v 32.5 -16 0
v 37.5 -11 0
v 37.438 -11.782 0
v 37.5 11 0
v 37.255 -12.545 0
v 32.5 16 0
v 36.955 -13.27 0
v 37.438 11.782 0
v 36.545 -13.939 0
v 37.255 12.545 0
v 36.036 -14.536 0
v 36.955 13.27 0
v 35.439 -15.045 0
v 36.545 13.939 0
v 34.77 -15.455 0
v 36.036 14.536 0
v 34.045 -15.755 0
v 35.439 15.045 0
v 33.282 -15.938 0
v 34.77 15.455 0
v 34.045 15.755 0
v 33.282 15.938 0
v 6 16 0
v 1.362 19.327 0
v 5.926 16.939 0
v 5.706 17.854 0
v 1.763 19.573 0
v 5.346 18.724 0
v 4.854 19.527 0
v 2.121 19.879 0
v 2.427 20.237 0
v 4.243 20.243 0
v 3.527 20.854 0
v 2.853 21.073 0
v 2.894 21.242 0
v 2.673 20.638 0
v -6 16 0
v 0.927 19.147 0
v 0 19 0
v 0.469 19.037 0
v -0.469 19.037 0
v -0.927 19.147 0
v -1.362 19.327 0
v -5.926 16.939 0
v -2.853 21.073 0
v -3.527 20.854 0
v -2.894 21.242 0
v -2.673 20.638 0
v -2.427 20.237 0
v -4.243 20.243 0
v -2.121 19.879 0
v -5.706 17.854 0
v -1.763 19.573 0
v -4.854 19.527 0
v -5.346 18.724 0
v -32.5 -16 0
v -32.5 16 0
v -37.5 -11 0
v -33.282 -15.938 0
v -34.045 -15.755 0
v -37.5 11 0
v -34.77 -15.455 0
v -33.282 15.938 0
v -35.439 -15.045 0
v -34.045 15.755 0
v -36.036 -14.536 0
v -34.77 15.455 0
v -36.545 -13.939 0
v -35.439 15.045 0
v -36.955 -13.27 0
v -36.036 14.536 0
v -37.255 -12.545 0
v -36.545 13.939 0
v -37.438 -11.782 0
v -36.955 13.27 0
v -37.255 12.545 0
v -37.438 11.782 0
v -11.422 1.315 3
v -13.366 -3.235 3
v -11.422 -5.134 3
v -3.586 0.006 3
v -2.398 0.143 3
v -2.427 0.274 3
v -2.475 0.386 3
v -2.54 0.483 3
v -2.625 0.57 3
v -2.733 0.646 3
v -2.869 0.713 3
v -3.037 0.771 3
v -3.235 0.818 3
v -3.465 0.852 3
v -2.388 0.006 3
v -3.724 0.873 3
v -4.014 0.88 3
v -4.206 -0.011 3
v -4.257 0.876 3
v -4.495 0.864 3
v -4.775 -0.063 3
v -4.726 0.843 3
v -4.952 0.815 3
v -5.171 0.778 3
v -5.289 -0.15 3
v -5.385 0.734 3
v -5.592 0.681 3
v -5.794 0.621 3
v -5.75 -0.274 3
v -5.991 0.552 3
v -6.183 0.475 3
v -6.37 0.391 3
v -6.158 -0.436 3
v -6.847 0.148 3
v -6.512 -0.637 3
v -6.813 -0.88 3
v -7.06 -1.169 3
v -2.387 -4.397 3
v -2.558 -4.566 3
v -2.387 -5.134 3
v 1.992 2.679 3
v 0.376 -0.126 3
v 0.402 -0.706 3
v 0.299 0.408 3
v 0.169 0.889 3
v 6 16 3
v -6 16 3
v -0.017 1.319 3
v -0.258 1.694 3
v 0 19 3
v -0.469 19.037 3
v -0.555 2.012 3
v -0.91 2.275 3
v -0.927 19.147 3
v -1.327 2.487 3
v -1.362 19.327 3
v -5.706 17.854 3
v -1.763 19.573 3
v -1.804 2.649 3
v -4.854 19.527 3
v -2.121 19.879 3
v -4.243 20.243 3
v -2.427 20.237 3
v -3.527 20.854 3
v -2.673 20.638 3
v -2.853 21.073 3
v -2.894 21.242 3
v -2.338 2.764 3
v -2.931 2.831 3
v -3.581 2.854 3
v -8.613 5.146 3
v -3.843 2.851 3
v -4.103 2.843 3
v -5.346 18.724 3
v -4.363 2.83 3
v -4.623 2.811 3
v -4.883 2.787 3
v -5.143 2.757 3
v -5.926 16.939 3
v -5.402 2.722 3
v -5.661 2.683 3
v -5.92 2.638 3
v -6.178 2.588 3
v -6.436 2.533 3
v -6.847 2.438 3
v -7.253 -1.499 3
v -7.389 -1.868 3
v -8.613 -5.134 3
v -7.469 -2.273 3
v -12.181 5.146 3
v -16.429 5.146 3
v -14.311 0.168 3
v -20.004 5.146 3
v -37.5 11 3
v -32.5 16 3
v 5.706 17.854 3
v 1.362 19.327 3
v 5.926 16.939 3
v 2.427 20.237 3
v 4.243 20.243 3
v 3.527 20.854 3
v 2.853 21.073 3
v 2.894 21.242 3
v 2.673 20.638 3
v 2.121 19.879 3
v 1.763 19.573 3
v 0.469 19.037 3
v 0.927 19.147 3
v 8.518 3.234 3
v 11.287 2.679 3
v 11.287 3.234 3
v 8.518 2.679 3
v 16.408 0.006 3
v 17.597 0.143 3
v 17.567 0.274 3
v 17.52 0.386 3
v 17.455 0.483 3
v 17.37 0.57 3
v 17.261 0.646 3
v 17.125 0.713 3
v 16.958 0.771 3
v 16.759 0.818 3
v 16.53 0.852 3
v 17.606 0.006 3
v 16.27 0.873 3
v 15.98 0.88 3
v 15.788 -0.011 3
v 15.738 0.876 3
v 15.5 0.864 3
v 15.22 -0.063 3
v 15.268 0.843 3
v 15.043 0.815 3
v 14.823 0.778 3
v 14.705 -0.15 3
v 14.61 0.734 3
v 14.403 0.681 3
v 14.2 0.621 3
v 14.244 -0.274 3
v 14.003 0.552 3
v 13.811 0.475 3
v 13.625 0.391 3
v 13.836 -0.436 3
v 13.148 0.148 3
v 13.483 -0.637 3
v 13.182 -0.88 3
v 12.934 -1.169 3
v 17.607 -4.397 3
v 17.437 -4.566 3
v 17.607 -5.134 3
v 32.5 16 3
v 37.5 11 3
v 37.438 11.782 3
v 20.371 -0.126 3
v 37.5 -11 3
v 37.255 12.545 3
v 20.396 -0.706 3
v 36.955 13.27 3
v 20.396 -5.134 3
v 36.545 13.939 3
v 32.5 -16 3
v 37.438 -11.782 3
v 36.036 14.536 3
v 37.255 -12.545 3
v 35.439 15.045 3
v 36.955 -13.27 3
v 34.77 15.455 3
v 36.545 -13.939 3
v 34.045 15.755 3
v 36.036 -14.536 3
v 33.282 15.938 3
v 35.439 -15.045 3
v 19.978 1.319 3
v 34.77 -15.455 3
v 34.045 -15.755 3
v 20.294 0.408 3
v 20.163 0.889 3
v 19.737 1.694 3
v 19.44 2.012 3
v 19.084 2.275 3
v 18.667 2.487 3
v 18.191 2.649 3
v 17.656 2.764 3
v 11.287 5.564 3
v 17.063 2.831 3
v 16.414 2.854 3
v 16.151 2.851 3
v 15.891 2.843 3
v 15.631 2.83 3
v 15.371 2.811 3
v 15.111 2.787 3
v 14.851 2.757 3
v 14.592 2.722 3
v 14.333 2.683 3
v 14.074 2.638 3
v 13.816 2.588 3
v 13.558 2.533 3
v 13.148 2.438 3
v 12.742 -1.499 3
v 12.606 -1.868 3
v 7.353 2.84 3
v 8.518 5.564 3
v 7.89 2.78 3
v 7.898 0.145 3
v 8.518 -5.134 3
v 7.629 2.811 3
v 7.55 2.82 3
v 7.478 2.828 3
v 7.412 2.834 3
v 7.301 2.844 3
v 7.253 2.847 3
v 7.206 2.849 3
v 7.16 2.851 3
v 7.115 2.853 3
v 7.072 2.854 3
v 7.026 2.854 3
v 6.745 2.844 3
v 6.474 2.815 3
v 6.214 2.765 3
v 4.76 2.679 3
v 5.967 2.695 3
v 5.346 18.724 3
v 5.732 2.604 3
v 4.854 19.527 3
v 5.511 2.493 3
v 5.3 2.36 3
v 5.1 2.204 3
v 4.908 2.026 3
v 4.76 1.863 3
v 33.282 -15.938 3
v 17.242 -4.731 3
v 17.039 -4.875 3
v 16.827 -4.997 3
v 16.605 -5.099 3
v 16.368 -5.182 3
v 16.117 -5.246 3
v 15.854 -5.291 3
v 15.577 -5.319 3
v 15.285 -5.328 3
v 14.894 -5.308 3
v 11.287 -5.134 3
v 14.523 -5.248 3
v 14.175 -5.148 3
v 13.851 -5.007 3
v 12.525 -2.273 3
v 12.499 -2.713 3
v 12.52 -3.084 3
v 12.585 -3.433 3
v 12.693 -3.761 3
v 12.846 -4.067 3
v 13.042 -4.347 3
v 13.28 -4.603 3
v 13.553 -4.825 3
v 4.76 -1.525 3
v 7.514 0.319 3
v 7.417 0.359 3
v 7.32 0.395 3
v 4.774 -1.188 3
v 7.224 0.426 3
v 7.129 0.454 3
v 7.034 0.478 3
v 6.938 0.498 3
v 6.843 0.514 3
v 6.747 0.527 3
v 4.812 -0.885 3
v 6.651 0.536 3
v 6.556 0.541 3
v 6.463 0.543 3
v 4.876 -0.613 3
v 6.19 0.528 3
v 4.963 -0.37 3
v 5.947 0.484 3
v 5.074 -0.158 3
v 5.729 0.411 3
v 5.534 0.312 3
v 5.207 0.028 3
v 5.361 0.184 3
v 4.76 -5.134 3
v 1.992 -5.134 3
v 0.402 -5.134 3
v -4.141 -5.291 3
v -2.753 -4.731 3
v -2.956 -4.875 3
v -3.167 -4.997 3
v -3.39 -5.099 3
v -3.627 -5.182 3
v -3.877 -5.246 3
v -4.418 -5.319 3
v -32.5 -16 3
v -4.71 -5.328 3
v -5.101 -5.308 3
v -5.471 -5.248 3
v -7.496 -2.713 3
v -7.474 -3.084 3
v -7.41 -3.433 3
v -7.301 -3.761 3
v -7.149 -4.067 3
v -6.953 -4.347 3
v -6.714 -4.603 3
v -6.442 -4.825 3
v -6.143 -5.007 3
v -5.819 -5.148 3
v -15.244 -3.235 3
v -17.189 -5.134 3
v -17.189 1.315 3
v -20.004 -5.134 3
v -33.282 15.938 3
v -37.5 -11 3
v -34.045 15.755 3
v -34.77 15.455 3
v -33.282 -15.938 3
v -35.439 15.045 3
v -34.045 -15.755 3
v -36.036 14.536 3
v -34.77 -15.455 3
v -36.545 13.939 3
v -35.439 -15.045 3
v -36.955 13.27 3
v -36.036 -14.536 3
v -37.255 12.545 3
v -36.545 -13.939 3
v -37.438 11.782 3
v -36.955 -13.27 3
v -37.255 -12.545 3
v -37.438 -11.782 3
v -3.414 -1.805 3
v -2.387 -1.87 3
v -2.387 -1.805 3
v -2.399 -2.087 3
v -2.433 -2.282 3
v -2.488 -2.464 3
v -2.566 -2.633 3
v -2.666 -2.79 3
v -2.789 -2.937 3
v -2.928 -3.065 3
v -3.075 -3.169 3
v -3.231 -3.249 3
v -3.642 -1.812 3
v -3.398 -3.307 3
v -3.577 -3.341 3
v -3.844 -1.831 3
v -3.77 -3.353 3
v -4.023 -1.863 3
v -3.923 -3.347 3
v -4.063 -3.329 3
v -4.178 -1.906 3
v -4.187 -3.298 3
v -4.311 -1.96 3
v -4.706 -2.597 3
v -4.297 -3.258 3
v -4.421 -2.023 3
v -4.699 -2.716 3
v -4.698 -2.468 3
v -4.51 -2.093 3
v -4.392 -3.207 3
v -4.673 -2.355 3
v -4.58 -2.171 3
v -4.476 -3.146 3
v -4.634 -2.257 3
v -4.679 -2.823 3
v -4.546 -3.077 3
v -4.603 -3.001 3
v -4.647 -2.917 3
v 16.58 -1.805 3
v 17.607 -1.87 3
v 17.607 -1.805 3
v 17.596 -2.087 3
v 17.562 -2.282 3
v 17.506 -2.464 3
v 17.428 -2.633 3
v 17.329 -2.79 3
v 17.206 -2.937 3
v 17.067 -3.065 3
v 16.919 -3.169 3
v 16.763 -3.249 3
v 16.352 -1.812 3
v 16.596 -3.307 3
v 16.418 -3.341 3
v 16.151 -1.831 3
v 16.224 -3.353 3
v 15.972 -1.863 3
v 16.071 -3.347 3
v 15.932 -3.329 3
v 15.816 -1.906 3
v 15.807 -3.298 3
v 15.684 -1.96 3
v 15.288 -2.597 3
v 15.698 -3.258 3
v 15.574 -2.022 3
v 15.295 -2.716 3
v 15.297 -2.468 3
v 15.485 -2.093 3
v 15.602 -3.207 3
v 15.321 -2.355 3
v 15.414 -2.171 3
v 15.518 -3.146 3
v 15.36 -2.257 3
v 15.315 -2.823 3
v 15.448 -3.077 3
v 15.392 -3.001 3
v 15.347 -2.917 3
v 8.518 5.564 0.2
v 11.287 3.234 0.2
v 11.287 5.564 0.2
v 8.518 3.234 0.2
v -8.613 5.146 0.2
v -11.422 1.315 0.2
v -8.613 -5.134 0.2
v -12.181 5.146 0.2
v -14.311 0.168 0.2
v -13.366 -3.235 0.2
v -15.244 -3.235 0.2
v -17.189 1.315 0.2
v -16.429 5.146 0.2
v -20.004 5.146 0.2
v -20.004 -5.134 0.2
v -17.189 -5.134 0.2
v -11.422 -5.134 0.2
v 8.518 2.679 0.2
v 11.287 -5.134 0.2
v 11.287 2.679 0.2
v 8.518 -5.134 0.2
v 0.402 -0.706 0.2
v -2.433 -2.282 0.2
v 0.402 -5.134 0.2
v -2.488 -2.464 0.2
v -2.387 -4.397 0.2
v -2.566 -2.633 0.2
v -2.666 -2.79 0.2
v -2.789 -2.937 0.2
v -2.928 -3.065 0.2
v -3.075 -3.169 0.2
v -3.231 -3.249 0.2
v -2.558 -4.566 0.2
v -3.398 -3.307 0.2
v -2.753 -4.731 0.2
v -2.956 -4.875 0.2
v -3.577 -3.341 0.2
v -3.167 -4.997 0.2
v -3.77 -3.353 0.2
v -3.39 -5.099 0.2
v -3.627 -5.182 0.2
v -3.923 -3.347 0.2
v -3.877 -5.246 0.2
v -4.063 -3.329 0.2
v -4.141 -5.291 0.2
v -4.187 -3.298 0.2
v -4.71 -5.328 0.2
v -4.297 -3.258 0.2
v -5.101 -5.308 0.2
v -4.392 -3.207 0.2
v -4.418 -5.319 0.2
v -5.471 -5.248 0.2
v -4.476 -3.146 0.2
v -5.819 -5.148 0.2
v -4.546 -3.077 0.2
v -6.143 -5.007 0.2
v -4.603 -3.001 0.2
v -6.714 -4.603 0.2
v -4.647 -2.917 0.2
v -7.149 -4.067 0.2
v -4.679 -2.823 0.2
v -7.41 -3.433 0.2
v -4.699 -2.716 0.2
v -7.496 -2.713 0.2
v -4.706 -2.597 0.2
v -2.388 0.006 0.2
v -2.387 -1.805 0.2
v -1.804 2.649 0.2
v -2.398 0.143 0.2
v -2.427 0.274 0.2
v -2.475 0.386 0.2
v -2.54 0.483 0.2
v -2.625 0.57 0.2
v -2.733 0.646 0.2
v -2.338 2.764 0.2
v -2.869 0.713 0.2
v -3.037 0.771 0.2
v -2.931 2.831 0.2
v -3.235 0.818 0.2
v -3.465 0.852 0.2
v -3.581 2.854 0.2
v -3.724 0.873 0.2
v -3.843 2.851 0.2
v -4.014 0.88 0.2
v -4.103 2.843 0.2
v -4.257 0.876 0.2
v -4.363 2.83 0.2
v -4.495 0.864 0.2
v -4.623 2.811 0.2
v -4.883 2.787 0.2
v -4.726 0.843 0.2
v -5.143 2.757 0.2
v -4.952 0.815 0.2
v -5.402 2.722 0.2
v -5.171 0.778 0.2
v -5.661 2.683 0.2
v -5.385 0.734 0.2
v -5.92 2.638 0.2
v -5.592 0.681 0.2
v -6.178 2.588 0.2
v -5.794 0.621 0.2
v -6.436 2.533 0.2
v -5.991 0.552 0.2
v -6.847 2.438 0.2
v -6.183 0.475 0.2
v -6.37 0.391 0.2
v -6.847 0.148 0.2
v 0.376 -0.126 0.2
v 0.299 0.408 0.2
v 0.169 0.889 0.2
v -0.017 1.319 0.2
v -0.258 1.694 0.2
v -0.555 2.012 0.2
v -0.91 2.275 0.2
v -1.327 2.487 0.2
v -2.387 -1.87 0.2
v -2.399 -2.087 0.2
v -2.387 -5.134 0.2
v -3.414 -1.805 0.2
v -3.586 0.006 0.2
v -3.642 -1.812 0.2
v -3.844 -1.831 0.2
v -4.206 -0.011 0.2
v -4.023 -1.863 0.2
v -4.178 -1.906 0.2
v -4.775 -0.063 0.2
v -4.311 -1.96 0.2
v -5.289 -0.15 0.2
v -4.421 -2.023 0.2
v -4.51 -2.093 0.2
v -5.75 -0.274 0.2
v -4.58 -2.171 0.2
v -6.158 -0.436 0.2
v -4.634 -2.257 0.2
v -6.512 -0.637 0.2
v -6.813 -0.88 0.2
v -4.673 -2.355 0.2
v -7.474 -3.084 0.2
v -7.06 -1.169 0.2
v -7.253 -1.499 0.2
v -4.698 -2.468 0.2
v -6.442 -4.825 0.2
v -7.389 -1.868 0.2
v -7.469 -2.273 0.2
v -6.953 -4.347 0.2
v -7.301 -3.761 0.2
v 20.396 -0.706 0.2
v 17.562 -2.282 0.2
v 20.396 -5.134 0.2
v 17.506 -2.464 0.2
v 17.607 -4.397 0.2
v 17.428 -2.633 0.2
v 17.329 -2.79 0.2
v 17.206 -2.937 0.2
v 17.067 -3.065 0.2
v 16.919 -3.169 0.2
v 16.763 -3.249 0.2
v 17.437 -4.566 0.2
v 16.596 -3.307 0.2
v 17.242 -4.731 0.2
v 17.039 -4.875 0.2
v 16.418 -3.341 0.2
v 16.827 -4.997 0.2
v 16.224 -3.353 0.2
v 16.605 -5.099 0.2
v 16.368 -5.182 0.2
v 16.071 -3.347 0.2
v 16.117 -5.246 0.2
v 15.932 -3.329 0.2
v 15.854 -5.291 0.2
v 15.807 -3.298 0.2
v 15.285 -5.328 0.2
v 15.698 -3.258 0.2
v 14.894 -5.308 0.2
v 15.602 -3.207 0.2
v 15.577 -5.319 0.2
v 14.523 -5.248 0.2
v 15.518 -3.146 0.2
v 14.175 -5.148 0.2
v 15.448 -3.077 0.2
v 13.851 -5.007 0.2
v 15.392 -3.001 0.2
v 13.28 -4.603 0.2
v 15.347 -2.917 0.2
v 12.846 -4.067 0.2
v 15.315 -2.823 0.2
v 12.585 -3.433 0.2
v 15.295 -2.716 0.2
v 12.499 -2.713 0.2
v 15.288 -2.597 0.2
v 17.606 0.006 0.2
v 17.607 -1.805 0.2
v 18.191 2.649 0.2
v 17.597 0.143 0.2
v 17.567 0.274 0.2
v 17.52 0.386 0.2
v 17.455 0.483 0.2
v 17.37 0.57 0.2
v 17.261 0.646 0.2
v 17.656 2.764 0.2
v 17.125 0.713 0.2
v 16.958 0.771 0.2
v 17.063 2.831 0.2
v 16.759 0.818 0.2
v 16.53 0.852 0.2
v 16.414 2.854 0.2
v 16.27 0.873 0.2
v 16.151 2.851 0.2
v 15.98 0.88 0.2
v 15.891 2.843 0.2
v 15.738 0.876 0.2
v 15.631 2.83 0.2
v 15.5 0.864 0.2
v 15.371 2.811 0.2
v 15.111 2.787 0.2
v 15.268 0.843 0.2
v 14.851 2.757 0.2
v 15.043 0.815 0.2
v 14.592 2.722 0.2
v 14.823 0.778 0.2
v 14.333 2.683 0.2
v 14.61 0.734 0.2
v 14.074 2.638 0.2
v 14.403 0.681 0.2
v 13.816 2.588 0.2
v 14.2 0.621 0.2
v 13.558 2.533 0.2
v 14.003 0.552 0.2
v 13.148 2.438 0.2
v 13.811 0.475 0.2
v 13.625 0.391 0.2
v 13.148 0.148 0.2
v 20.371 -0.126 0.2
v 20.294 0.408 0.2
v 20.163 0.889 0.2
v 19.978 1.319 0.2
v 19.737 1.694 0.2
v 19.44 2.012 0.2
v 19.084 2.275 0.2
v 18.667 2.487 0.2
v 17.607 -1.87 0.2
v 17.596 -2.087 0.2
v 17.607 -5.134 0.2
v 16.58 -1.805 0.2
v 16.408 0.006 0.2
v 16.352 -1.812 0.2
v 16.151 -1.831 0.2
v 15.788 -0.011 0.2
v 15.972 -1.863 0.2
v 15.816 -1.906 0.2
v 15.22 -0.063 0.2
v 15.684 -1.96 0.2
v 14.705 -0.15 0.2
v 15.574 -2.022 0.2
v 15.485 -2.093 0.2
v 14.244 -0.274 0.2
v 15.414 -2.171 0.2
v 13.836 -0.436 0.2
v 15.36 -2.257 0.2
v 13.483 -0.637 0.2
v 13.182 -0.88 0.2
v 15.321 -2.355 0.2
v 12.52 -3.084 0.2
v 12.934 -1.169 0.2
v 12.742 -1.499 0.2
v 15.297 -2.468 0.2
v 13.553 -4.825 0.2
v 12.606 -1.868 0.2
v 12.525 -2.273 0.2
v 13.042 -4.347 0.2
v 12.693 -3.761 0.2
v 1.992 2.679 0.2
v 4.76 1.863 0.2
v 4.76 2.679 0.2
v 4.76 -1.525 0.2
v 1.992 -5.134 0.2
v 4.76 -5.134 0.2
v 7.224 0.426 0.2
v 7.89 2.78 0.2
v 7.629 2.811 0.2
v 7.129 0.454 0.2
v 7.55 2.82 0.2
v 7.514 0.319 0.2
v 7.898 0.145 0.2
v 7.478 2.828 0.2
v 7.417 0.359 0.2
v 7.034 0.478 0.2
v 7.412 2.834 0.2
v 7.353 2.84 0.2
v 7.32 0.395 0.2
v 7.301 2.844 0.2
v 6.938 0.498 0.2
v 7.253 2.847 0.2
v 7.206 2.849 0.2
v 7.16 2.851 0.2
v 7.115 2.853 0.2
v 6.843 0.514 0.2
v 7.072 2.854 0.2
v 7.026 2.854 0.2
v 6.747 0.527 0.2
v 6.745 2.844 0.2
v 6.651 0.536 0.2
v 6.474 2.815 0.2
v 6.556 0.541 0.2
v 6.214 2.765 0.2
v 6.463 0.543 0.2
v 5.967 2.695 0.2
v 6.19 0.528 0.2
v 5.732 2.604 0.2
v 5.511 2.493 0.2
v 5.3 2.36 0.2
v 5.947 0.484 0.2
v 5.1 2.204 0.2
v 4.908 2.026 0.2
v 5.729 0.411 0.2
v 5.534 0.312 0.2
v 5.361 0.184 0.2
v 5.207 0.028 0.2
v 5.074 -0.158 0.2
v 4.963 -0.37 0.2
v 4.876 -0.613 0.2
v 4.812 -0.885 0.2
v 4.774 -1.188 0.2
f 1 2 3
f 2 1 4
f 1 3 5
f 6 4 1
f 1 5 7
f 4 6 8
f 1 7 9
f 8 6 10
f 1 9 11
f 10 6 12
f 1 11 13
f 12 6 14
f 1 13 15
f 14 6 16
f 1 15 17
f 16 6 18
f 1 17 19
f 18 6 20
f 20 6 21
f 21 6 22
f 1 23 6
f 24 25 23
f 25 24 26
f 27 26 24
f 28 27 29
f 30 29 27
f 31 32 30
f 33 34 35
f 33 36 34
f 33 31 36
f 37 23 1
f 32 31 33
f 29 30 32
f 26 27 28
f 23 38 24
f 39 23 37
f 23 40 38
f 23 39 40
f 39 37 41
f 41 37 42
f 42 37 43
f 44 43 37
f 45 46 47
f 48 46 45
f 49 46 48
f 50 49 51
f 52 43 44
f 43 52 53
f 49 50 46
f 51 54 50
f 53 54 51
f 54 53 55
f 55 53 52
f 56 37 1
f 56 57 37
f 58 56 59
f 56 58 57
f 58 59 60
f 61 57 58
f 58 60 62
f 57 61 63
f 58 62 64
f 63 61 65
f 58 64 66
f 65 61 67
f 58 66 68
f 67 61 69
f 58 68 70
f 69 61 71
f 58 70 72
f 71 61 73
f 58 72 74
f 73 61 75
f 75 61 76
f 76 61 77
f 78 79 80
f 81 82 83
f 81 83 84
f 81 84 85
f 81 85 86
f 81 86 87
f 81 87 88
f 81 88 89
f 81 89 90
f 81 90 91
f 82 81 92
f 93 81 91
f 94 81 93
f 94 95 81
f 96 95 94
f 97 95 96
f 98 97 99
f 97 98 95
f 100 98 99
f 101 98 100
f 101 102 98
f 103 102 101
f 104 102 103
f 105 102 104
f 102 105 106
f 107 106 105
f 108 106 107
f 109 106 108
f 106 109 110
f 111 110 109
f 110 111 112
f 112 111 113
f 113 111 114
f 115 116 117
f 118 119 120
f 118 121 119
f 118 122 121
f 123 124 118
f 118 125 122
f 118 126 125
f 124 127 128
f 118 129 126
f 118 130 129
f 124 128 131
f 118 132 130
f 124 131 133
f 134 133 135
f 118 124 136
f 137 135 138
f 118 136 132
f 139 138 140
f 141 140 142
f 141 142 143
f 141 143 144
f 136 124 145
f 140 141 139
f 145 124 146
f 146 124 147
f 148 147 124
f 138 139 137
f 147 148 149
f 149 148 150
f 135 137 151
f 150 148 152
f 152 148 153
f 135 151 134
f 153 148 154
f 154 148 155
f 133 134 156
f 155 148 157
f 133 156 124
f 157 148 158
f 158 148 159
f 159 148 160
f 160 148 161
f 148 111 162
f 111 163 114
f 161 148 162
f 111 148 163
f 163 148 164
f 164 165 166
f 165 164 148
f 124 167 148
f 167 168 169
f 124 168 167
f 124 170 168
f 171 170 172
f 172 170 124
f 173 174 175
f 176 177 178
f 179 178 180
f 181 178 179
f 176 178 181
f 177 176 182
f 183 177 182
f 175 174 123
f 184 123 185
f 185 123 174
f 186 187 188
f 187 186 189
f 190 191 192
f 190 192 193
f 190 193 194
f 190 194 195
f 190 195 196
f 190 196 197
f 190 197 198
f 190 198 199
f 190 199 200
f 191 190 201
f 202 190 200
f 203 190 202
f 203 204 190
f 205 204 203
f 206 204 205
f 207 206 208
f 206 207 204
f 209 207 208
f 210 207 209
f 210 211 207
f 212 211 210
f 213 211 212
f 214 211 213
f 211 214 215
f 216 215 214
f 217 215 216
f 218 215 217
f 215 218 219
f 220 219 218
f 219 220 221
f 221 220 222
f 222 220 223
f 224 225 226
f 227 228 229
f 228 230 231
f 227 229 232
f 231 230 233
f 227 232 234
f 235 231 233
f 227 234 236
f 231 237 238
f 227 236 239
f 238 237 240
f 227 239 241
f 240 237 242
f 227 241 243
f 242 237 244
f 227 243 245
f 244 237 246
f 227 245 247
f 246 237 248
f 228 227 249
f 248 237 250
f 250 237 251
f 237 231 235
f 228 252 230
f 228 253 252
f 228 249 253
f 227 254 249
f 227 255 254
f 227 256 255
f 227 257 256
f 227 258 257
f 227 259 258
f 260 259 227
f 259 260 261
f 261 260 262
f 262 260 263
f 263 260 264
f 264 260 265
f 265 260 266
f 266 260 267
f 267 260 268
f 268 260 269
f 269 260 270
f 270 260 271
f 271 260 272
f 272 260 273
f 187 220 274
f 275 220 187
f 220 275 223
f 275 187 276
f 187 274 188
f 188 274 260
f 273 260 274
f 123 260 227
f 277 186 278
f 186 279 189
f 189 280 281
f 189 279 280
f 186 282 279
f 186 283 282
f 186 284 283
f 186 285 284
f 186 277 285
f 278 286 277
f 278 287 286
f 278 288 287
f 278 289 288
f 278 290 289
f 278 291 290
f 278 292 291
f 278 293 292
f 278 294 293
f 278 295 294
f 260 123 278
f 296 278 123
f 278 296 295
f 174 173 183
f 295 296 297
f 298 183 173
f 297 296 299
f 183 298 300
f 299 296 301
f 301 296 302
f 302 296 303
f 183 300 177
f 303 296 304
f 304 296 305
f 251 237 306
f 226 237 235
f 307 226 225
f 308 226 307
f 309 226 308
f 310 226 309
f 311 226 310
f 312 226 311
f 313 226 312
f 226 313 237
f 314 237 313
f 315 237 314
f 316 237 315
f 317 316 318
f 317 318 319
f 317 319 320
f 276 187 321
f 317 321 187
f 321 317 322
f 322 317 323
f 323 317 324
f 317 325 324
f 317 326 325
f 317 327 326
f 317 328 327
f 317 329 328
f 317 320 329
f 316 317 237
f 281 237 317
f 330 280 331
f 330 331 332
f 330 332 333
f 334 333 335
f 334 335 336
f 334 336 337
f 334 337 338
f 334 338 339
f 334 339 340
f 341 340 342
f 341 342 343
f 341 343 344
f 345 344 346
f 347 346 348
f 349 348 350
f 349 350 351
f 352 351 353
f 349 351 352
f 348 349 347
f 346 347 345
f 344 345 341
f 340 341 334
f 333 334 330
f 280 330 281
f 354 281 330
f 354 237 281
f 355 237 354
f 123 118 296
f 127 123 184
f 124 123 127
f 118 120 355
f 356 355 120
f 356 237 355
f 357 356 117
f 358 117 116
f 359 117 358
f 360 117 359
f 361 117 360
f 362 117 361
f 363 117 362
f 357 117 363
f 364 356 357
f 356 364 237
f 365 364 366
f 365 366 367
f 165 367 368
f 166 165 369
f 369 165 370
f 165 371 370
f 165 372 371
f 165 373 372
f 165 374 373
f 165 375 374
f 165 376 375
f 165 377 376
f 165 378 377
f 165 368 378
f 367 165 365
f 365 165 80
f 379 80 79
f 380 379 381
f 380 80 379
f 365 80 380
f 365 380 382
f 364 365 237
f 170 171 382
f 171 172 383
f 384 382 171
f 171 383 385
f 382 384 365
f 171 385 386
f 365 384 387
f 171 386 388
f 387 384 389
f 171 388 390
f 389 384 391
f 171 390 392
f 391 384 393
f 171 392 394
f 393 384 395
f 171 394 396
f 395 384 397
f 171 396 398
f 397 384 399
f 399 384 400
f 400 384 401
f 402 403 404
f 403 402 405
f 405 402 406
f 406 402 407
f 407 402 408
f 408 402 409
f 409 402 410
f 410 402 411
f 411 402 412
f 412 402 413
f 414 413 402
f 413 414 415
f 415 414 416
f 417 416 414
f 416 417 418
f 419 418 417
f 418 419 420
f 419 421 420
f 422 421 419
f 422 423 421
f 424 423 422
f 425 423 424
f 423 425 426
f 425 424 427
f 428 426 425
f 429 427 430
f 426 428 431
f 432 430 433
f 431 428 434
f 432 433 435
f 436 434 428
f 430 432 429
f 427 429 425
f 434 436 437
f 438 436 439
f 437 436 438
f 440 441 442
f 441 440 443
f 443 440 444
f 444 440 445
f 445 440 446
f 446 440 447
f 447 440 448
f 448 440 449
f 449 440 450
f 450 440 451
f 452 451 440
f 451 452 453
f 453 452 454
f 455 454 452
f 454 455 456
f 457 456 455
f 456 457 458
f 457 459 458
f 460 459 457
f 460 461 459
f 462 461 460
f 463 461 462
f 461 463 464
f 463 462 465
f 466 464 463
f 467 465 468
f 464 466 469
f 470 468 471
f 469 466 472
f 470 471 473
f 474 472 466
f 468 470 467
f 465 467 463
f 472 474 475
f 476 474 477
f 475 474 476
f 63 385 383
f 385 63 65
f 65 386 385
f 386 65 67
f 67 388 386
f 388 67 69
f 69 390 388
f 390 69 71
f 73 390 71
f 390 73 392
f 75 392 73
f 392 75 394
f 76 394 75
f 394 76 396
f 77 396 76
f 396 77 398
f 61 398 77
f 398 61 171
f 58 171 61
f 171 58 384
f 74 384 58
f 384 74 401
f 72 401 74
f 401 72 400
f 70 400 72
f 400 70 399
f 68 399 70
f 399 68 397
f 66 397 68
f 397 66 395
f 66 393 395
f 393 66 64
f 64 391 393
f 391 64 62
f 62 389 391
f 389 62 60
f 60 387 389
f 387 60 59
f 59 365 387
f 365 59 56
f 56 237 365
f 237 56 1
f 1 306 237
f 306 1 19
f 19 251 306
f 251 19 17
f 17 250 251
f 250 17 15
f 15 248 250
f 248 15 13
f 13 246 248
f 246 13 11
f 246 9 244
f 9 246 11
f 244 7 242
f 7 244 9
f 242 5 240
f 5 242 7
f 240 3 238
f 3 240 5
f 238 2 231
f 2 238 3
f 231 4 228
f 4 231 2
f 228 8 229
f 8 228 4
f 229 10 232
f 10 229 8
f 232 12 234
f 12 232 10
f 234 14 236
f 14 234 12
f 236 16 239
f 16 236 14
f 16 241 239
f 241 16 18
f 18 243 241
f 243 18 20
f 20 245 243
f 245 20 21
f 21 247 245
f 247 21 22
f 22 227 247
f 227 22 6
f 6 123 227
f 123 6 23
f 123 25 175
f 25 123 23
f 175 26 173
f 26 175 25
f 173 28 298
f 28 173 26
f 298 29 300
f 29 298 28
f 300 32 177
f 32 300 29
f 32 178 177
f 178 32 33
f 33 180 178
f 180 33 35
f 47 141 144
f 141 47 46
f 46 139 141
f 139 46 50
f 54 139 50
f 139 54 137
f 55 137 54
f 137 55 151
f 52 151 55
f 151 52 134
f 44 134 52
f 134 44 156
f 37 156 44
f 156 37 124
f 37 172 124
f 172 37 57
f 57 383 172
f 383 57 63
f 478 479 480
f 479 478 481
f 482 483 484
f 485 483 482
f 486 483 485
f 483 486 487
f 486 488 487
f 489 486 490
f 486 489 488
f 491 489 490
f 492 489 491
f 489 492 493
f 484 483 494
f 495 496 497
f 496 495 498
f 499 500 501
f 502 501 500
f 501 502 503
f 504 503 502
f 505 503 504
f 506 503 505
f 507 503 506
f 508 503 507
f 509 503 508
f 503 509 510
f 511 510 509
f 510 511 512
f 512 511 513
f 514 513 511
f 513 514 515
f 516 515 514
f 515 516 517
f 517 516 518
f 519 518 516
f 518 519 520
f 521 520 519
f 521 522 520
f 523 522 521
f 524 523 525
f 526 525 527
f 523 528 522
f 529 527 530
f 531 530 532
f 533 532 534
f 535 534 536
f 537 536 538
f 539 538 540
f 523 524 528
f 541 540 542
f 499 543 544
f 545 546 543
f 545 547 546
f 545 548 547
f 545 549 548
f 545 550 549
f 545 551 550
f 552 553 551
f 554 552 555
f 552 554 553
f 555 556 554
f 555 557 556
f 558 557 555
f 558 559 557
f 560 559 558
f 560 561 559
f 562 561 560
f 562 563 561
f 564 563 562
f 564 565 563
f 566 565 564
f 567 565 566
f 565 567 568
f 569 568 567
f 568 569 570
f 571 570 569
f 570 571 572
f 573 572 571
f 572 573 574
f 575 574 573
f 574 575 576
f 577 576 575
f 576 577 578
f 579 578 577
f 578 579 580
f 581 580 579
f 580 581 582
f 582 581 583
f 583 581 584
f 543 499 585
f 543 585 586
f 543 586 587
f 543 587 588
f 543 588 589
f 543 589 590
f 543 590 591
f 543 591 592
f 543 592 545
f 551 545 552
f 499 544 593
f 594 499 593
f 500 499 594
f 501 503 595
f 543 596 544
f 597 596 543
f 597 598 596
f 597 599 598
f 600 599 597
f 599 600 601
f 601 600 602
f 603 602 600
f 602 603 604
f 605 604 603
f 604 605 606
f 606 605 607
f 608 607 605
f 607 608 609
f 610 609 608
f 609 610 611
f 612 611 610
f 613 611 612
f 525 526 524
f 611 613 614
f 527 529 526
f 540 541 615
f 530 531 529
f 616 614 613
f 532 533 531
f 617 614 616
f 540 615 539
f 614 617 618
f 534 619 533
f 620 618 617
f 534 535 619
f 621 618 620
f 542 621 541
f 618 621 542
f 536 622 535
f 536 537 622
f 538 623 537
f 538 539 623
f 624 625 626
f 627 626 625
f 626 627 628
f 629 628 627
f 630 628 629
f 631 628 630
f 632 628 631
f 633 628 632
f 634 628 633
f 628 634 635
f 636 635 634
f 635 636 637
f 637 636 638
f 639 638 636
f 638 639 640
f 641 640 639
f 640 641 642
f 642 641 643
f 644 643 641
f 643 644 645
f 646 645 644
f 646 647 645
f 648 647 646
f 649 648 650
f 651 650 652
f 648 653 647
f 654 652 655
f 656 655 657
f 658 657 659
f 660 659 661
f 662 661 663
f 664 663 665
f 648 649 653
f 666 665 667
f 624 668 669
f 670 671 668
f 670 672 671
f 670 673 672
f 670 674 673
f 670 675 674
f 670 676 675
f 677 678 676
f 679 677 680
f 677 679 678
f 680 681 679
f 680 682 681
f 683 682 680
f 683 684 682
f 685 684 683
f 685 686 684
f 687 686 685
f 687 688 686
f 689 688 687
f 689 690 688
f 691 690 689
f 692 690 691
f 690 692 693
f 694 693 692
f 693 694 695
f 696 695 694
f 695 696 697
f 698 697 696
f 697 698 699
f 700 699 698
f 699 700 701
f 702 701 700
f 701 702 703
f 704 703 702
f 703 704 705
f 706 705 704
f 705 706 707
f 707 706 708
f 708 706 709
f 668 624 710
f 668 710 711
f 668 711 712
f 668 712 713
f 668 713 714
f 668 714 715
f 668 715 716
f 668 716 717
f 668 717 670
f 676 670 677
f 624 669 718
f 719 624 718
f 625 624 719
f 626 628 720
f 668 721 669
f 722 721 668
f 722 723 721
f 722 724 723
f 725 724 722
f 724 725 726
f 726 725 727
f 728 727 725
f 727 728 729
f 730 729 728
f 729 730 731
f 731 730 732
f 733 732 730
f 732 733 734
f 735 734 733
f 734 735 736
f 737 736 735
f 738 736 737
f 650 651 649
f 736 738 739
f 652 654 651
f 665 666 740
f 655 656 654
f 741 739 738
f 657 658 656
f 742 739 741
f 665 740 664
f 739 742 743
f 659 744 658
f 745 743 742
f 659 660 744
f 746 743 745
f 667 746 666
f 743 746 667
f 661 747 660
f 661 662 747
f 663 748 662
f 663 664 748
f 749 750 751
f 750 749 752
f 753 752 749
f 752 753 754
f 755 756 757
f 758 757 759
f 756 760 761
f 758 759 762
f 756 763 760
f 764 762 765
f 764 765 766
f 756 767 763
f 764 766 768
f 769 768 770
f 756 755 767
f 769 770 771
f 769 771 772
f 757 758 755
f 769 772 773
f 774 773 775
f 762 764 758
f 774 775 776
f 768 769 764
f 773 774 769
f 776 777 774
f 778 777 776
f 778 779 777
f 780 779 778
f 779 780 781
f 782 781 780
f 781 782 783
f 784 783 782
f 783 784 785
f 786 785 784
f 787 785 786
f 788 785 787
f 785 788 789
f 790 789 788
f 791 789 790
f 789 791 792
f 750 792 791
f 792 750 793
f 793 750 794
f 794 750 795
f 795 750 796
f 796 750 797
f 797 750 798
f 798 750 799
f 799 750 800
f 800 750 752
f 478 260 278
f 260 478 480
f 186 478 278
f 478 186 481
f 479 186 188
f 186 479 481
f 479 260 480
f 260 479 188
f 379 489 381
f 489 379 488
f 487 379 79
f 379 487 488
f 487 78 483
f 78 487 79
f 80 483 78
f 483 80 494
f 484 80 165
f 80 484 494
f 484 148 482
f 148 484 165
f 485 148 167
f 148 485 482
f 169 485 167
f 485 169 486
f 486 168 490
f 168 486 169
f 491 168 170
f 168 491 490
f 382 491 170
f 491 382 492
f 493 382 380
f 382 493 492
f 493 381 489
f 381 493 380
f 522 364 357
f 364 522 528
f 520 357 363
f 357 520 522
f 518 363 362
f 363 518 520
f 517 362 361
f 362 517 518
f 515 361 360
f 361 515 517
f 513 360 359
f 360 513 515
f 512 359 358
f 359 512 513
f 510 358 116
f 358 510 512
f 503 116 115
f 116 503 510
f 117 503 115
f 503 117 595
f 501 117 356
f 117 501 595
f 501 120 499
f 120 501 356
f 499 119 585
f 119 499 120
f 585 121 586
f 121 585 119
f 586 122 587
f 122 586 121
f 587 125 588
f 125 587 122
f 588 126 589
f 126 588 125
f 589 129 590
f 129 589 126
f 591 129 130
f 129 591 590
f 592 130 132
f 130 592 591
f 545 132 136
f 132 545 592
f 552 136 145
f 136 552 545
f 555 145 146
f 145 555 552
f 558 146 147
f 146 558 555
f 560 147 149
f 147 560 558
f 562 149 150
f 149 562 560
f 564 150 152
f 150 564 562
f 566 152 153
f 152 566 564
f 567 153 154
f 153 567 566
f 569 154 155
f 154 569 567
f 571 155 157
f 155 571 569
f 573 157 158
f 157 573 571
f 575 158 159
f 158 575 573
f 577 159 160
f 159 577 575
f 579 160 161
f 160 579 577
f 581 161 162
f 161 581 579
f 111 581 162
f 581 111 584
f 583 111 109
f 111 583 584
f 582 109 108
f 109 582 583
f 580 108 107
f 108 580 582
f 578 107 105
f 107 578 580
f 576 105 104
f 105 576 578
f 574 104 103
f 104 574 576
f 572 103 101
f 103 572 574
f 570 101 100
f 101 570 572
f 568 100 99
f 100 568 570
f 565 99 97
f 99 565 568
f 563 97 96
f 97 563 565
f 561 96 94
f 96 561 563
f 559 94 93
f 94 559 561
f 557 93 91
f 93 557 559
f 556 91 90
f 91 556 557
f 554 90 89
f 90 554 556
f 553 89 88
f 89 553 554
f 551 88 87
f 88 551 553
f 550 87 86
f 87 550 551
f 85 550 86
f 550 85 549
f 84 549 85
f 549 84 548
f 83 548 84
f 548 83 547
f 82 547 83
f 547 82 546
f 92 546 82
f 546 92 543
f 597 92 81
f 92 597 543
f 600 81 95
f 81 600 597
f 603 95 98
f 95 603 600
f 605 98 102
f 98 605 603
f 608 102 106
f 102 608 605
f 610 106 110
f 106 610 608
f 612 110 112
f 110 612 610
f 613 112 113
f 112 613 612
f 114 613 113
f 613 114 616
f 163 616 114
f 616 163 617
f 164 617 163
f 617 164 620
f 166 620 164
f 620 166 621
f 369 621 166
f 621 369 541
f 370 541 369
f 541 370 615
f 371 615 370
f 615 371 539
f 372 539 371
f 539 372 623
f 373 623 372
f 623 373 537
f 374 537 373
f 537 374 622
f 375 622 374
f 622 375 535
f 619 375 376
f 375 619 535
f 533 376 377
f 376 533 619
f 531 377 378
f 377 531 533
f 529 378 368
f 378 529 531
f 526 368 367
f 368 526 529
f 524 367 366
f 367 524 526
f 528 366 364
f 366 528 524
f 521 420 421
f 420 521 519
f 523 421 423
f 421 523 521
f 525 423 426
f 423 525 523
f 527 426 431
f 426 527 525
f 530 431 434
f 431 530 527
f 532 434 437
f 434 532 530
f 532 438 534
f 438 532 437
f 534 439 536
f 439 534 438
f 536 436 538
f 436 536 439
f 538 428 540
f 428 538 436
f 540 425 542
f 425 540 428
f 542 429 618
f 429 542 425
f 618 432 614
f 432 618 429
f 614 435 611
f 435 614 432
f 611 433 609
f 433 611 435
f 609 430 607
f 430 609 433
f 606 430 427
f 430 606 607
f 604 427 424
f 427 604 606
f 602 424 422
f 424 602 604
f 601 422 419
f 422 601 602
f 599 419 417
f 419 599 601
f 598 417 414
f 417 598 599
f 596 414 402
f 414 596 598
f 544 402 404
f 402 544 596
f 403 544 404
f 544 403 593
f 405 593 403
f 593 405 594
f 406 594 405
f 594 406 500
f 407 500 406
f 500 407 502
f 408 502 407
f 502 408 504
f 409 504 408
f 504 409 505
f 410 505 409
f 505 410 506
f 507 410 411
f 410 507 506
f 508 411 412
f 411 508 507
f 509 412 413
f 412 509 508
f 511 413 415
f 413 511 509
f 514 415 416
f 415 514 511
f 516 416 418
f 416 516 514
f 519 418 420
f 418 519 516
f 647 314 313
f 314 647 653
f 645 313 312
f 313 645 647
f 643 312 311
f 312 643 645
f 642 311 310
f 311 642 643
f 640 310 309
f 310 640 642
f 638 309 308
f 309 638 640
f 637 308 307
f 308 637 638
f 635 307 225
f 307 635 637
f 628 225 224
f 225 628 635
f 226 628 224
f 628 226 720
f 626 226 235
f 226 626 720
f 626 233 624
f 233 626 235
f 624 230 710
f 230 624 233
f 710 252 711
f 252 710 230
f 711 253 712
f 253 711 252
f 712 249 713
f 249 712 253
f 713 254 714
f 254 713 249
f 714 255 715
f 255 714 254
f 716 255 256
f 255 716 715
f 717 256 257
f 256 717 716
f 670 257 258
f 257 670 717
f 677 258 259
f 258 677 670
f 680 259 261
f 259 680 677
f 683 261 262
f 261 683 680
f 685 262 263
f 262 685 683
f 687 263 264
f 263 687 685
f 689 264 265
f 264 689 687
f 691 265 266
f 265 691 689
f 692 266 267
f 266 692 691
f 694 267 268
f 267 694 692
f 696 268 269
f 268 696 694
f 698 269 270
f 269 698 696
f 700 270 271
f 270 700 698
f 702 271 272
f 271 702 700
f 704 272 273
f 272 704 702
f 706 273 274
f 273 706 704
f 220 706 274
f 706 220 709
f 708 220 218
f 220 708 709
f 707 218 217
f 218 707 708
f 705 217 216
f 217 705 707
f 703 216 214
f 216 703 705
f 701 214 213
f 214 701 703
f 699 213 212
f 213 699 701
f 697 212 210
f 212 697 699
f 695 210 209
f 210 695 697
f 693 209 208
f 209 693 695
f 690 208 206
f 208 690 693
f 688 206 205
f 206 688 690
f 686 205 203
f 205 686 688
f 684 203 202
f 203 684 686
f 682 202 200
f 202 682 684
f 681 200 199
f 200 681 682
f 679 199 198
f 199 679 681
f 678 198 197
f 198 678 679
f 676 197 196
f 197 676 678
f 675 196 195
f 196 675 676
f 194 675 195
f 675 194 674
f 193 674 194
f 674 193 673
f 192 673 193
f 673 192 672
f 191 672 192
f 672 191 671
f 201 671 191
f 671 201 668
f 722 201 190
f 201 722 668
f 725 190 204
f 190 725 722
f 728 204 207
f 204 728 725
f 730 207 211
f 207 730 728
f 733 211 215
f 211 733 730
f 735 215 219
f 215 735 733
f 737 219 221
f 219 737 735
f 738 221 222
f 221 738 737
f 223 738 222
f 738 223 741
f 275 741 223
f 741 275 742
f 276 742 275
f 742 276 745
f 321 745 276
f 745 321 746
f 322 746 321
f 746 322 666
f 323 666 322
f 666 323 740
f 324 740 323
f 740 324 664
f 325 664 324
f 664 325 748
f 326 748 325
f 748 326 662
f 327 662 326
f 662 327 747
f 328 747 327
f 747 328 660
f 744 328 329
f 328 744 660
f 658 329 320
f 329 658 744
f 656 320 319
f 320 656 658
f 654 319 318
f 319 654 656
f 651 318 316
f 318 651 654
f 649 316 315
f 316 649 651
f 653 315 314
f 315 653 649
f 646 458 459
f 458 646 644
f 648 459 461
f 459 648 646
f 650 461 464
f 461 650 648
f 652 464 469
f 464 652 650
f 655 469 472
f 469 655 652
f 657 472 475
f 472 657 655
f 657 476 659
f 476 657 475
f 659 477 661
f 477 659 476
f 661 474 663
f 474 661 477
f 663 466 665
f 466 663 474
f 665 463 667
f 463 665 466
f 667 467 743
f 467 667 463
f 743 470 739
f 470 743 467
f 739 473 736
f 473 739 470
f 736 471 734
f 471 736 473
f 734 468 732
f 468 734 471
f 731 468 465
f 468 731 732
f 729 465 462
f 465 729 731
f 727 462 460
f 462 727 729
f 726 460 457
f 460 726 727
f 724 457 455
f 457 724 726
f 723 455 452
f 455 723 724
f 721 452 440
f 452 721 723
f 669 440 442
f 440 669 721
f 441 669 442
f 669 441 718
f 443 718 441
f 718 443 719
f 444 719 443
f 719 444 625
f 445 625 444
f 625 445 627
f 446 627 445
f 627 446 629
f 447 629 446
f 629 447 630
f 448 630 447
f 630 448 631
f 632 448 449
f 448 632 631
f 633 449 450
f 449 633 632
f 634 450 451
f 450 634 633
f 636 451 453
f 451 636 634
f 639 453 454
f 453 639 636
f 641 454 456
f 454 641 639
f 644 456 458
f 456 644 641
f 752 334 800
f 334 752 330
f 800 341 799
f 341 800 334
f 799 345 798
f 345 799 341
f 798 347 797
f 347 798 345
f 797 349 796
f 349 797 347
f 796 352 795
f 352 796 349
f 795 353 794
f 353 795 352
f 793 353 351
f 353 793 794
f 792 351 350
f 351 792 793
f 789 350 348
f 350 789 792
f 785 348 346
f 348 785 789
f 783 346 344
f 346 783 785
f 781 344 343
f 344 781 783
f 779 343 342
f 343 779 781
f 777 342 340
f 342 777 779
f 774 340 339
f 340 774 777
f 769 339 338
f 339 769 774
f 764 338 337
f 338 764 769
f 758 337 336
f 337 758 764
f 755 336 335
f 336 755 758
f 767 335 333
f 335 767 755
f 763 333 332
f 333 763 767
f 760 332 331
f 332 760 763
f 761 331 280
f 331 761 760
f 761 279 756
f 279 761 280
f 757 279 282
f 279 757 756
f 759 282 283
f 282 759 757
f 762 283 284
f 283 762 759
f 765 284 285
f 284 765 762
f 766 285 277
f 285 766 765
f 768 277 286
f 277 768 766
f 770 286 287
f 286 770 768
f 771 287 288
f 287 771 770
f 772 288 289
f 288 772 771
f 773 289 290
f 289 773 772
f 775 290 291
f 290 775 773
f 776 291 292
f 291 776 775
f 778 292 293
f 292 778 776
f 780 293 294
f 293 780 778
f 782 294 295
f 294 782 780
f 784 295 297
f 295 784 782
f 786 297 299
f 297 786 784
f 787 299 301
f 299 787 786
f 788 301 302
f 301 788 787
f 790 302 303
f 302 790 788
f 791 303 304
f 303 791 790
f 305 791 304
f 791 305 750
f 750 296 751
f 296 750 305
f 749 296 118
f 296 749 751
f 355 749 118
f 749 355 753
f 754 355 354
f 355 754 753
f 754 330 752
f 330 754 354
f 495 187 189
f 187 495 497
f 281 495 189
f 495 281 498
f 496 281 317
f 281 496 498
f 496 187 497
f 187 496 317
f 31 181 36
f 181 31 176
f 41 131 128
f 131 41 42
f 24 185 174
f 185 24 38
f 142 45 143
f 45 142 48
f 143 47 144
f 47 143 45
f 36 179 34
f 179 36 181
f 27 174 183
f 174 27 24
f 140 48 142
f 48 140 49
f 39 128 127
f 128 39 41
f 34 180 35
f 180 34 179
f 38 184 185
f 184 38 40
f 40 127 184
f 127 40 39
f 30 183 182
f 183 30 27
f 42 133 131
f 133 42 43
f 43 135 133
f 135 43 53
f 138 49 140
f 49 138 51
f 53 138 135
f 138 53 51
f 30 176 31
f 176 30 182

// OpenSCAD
// Text Offset Keychain - 2 Colors
// Keychain with 2-color layered text

// --- Parameters ---
Name          = "Maria";
Font          = "Bebas Neue";
Name_Size     = 40;
Rect_Width    = 75;
Rect_Height   = 32;
Corner_Radius = 5;
Tolerance     = 0.2;
Base_Height   = 3;
Layer_Height  = 3;
Ring_Hole_D   = 6;
Part          = "Base";

$fn = 40;

module name_shape(txt, fnt) {
  resize([Name_Size, 0, 0], auto=true)
  text(txt, size=16, font=fnt, halign="center", valign="center");
}

module rect_2d(w, h, r) {
  offset(r=r) offset(-r)
  square([w, h], center=true);
}

module ring_hole_2d() {
  translate([0, Rect_Height / 2 + Ring_Hole_D / 2 + 3])
  circle(d=Ring_Hole_D);
}

module body_2d() {
  union() {
    rect_2d(Rect_Width, Rect_Height, Corner_Radius);
    hull() {
      translate([0, Rect_Height / 2])
      circle(d=Ring_Hole_D + 6);
      translate([0, Rect_Height / 2 - 3])
      square([Ring_Hole_D + 6, 1], center=true);
    }
  }
}

module base_part() {
  difference() {
    linear_extrude(Base_Height)
    body_2d();

    // Text pocket
    translate([0, 0, Base_Height - Layer_Height + Tolerance])
    linear_extrude(Layer_Height + 1)
    offset(delta=Tolerance)
    name_shape(Name, str(Font, ":style=Bold"));

    // Ring hole
    translate([0, Rect_Height / 2 + Ring_Hole_D / 2 + 3, -0.5])
    linear_extrude(Base_Height + 1)
    circle(d=Ring_Hole_D);
  }
}

module top_part() {
  difference() {
    linear_extrude(Layer_Height)
    name_shape(Name, str(Font, ":style=Bold"));

    // Ensure ring hole area is clear
    translate([0, Rect_Height / 2 + Ring_Hole_D / 2 + 3, -0.5])
    linear_extrude(Layer_Height + 1)
    circle(d=Ring_Hole_D + 2);
  }
}

if (Part == "Base") {
  base_part();
} else if (Part == "Top") {
  translate([0, 0, Base_Height])
  top_part();
}
